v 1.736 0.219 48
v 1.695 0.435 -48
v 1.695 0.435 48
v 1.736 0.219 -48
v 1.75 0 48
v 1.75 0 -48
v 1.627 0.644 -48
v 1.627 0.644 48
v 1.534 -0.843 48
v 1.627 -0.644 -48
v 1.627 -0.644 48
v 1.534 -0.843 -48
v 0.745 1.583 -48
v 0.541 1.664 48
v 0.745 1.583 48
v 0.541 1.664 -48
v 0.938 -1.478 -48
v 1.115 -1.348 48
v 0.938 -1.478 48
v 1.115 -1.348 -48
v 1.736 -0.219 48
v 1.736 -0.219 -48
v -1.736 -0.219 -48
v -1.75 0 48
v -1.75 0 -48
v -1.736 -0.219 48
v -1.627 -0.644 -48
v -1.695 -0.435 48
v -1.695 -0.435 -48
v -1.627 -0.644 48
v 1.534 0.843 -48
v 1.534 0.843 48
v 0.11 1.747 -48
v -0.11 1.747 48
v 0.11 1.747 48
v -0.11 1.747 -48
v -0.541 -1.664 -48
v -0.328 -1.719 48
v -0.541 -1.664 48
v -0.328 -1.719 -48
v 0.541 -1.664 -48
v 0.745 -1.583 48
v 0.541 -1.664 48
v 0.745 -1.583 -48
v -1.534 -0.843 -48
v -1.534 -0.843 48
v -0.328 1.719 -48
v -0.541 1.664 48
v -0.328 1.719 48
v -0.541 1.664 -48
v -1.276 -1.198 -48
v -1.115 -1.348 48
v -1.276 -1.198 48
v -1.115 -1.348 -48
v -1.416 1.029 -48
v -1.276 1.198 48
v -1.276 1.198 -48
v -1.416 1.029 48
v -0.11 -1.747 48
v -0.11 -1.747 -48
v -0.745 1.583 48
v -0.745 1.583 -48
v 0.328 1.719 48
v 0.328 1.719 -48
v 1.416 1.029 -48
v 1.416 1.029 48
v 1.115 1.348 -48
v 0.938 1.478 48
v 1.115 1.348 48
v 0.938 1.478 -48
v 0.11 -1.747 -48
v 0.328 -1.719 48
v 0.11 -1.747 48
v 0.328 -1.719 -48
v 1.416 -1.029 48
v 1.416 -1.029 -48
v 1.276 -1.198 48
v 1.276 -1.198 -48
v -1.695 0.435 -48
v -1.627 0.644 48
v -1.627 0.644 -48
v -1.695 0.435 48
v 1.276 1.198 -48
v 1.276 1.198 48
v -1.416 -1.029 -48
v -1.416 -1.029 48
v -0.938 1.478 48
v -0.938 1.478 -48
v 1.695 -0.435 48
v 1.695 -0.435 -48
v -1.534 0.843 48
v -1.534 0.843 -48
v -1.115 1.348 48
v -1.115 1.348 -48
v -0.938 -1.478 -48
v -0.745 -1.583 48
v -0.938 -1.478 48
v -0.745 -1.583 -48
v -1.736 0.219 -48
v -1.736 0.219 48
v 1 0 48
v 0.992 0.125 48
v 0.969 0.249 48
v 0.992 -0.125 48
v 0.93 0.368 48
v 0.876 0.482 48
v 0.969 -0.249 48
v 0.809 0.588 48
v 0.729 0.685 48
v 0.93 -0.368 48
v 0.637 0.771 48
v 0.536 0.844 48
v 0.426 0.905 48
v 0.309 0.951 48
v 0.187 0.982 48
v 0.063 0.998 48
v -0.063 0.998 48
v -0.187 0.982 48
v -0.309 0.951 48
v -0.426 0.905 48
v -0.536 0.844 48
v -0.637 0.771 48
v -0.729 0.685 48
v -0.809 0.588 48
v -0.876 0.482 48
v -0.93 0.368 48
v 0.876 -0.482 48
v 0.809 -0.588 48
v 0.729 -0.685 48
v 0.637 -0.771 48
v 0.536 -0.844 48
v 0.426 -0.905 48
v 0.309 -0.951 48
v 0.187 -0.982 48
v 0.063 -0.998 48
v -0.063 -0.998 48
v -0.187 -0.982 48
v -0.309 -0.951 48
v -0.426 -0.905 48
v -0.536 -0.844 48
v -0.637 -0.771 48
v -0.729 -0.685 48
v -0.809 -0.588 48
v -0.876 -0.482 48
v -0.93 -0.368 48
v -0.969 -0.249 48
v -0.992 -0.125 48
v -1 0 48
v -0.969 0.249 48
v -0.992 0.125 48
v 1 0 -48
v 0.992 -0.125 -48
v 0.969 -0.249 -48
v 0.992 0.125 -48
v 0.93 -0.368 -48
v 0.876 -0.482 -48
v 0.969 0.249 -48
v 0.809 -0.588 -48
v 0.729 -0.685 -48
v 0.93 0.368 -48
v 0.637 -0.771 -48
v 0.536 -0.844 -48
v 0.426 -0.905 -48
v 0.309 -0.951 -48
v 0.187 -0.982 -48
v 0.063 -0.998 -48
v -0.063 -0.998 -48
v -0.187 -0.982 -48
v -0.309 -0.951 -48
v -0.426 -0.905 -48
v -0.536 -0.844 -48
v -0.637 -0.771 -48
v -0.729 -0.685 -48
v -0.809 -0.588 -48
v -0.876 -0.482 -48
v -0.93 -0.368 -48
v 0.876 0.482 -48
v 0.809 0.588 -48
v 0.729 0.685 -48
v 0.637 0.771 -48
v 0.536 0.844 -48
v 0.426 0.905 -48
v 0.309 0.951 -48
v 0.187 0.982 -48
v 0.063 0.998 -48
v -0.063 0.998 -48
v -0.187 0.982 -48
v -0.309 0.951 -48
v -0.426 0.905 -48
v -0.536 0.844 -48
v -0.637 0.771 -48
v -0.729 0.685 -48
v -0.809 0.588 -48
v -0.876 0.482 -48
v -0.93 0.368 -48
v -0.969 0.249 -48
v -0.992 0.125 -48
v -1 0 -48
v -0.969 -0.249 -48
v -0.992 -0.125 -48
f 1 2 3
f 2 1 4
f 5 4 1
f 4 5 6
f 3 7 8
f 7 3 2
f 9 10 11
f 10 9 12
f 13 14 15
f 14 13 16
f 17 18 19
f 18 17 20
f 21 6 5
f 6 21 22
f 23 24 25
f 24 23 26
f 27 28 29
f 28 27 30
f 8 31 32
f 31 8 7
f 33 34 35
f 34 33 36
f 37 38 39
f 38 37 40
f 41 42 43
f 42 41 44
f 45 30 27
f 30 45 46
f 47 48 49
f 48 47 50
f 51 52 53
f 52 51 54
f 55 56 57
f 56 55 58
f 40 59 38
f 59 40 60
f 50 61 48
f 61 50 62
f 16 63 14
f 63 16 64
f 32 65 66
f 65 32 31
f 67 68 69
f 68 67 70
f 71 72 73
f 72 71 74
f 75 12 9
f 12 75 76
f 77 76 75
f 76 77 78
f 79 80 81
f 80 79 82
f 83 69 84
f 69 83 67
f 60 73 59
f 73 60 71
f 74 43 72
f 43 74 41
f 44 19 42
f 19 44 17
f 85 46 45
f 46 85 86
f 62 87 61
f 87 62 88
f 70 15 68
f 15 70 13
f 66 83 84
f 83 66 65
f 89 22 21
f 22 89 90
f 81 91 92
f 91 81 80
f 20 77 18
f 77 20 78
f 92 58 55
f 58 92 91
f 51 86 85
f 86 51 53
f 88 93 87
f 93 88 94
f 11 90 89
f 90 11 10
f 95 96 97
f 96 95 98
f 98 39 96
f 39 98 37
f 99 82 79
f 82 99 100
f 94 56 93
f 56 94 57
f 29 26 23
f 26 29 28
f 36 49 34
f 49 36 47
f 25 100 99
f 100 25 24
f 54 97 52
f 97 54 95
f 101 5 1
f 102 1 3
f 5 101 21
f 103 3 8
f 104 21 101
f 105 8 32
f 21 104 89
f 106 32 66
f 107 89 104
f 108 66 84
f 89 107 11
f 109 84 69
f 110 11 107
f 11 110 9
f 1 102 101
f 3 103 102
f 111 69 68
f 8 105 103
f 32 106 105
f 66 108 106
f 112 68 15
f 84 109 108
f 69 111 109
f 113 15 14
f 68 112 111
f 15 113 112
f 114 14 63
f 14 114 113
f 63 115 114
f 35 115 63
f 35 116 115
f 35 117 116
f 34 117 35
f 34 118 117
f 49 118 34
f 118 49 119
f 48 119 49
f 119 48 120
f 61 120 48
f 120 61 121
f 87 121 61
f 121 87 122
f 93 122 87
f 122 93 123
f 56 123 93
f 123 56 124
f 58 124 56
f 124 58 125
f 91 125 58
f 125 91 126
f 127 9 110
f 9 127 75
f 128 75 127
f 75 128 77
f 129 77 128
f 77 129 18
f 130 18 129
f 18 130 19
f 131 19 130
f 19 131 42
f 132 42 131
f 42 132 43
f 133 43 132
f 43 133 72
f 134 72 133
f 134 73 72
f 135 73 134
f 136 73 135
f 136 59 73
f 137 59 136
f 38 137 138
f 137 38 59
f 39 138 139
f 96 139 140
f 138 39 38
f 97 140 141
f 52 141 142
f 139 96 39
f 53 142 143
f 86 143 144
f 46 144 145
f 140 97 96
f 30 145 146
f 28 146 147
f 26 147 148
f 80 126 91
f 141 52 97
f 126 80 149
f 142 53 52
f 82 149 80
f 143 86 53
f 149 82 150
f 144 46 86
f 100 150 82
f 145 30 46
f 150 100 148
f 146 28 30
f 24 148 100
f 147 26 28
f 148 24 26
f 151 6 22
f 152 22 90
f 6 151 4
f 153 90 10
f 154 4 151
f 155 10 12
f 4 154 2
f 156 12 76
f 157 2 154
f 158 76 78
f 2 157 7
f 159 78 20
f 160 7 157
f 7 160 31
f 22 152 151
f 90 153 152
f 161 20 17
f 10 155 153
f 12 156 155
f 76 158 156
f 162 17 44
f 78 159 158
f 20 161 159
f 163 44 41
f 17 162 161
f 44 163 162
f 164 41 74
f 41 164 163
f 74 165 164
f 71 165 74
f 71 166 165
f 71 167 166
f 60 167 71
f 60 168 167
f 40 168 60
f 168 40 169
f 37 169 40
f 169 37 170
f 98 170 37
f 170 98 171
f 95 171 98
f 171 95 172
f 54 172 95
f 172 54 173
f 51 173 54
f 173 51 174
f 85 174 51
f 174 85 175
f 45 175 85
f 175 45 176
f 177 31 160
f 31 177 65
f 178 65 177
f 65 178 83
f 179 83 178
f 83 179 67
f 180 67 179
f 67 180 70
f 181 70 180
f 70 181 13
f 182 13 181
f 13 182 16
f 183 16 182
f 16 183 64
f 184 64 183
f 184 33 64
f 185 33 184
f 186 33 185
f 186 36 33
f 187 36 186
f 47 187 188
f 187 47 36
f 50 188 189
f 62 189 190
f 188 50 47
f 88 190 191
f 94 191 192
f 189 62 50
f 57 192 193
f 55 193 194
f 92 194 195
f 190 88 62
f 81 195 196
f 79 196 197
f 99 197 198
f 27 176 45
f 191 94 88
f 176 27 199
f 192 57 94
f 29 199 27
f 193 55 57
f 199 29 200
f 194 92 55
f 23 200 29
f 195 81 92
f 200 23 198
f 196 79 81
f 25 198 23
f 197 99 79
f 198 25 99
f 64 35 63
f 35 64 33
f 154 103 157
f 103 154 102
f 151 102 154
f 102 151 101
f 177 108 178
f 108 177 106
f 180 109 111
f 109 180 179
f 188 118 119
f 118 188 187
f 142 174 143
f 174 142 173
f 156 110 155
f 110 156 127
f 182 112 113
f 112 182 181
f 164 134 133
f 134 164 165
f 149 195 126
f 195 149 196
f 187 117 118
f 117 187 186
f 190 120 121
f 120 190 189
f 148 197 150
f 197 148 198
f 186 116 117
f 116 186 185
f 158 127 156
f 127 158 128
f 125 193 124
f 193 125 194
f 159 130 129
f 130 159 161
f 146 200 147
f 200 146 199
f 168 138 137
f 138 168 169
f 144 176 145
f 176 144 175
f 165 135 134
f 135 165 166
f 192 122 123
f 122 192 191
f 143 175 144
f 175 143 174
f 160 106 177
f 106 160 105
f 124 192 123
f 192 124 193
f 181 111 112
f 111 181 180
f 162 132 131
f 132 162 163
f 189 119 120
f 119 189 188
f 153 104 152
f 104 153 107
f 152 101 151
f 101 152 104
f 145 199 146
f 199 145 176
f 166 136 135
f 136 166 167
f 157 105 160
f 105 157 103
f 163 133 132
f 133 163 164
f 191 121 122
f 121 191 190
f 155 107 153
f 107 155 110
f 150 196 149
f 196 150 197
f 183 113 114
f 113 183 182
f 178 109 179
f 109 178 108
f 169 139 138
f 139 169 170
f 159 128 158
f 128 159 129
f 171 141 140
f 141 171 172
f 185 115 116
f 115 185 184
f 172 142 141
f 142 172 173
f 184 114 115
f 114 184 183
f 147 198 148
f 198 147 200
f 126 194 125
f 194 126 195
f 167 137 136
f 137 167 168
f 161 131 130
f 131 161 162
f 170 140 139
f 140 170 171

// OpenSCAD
$fn = 50;


difference() {
	union() {
		translate(v = [0, 0, -48.0000000000]) {
			cylinder(h = 96, r = 1.7500000000);
		}
	}
	union() {
		translate(v = [0, 0, -100.0000000000]) {
			cylinder(h = 200, r = 1.0000000000);
		}
	}
}
